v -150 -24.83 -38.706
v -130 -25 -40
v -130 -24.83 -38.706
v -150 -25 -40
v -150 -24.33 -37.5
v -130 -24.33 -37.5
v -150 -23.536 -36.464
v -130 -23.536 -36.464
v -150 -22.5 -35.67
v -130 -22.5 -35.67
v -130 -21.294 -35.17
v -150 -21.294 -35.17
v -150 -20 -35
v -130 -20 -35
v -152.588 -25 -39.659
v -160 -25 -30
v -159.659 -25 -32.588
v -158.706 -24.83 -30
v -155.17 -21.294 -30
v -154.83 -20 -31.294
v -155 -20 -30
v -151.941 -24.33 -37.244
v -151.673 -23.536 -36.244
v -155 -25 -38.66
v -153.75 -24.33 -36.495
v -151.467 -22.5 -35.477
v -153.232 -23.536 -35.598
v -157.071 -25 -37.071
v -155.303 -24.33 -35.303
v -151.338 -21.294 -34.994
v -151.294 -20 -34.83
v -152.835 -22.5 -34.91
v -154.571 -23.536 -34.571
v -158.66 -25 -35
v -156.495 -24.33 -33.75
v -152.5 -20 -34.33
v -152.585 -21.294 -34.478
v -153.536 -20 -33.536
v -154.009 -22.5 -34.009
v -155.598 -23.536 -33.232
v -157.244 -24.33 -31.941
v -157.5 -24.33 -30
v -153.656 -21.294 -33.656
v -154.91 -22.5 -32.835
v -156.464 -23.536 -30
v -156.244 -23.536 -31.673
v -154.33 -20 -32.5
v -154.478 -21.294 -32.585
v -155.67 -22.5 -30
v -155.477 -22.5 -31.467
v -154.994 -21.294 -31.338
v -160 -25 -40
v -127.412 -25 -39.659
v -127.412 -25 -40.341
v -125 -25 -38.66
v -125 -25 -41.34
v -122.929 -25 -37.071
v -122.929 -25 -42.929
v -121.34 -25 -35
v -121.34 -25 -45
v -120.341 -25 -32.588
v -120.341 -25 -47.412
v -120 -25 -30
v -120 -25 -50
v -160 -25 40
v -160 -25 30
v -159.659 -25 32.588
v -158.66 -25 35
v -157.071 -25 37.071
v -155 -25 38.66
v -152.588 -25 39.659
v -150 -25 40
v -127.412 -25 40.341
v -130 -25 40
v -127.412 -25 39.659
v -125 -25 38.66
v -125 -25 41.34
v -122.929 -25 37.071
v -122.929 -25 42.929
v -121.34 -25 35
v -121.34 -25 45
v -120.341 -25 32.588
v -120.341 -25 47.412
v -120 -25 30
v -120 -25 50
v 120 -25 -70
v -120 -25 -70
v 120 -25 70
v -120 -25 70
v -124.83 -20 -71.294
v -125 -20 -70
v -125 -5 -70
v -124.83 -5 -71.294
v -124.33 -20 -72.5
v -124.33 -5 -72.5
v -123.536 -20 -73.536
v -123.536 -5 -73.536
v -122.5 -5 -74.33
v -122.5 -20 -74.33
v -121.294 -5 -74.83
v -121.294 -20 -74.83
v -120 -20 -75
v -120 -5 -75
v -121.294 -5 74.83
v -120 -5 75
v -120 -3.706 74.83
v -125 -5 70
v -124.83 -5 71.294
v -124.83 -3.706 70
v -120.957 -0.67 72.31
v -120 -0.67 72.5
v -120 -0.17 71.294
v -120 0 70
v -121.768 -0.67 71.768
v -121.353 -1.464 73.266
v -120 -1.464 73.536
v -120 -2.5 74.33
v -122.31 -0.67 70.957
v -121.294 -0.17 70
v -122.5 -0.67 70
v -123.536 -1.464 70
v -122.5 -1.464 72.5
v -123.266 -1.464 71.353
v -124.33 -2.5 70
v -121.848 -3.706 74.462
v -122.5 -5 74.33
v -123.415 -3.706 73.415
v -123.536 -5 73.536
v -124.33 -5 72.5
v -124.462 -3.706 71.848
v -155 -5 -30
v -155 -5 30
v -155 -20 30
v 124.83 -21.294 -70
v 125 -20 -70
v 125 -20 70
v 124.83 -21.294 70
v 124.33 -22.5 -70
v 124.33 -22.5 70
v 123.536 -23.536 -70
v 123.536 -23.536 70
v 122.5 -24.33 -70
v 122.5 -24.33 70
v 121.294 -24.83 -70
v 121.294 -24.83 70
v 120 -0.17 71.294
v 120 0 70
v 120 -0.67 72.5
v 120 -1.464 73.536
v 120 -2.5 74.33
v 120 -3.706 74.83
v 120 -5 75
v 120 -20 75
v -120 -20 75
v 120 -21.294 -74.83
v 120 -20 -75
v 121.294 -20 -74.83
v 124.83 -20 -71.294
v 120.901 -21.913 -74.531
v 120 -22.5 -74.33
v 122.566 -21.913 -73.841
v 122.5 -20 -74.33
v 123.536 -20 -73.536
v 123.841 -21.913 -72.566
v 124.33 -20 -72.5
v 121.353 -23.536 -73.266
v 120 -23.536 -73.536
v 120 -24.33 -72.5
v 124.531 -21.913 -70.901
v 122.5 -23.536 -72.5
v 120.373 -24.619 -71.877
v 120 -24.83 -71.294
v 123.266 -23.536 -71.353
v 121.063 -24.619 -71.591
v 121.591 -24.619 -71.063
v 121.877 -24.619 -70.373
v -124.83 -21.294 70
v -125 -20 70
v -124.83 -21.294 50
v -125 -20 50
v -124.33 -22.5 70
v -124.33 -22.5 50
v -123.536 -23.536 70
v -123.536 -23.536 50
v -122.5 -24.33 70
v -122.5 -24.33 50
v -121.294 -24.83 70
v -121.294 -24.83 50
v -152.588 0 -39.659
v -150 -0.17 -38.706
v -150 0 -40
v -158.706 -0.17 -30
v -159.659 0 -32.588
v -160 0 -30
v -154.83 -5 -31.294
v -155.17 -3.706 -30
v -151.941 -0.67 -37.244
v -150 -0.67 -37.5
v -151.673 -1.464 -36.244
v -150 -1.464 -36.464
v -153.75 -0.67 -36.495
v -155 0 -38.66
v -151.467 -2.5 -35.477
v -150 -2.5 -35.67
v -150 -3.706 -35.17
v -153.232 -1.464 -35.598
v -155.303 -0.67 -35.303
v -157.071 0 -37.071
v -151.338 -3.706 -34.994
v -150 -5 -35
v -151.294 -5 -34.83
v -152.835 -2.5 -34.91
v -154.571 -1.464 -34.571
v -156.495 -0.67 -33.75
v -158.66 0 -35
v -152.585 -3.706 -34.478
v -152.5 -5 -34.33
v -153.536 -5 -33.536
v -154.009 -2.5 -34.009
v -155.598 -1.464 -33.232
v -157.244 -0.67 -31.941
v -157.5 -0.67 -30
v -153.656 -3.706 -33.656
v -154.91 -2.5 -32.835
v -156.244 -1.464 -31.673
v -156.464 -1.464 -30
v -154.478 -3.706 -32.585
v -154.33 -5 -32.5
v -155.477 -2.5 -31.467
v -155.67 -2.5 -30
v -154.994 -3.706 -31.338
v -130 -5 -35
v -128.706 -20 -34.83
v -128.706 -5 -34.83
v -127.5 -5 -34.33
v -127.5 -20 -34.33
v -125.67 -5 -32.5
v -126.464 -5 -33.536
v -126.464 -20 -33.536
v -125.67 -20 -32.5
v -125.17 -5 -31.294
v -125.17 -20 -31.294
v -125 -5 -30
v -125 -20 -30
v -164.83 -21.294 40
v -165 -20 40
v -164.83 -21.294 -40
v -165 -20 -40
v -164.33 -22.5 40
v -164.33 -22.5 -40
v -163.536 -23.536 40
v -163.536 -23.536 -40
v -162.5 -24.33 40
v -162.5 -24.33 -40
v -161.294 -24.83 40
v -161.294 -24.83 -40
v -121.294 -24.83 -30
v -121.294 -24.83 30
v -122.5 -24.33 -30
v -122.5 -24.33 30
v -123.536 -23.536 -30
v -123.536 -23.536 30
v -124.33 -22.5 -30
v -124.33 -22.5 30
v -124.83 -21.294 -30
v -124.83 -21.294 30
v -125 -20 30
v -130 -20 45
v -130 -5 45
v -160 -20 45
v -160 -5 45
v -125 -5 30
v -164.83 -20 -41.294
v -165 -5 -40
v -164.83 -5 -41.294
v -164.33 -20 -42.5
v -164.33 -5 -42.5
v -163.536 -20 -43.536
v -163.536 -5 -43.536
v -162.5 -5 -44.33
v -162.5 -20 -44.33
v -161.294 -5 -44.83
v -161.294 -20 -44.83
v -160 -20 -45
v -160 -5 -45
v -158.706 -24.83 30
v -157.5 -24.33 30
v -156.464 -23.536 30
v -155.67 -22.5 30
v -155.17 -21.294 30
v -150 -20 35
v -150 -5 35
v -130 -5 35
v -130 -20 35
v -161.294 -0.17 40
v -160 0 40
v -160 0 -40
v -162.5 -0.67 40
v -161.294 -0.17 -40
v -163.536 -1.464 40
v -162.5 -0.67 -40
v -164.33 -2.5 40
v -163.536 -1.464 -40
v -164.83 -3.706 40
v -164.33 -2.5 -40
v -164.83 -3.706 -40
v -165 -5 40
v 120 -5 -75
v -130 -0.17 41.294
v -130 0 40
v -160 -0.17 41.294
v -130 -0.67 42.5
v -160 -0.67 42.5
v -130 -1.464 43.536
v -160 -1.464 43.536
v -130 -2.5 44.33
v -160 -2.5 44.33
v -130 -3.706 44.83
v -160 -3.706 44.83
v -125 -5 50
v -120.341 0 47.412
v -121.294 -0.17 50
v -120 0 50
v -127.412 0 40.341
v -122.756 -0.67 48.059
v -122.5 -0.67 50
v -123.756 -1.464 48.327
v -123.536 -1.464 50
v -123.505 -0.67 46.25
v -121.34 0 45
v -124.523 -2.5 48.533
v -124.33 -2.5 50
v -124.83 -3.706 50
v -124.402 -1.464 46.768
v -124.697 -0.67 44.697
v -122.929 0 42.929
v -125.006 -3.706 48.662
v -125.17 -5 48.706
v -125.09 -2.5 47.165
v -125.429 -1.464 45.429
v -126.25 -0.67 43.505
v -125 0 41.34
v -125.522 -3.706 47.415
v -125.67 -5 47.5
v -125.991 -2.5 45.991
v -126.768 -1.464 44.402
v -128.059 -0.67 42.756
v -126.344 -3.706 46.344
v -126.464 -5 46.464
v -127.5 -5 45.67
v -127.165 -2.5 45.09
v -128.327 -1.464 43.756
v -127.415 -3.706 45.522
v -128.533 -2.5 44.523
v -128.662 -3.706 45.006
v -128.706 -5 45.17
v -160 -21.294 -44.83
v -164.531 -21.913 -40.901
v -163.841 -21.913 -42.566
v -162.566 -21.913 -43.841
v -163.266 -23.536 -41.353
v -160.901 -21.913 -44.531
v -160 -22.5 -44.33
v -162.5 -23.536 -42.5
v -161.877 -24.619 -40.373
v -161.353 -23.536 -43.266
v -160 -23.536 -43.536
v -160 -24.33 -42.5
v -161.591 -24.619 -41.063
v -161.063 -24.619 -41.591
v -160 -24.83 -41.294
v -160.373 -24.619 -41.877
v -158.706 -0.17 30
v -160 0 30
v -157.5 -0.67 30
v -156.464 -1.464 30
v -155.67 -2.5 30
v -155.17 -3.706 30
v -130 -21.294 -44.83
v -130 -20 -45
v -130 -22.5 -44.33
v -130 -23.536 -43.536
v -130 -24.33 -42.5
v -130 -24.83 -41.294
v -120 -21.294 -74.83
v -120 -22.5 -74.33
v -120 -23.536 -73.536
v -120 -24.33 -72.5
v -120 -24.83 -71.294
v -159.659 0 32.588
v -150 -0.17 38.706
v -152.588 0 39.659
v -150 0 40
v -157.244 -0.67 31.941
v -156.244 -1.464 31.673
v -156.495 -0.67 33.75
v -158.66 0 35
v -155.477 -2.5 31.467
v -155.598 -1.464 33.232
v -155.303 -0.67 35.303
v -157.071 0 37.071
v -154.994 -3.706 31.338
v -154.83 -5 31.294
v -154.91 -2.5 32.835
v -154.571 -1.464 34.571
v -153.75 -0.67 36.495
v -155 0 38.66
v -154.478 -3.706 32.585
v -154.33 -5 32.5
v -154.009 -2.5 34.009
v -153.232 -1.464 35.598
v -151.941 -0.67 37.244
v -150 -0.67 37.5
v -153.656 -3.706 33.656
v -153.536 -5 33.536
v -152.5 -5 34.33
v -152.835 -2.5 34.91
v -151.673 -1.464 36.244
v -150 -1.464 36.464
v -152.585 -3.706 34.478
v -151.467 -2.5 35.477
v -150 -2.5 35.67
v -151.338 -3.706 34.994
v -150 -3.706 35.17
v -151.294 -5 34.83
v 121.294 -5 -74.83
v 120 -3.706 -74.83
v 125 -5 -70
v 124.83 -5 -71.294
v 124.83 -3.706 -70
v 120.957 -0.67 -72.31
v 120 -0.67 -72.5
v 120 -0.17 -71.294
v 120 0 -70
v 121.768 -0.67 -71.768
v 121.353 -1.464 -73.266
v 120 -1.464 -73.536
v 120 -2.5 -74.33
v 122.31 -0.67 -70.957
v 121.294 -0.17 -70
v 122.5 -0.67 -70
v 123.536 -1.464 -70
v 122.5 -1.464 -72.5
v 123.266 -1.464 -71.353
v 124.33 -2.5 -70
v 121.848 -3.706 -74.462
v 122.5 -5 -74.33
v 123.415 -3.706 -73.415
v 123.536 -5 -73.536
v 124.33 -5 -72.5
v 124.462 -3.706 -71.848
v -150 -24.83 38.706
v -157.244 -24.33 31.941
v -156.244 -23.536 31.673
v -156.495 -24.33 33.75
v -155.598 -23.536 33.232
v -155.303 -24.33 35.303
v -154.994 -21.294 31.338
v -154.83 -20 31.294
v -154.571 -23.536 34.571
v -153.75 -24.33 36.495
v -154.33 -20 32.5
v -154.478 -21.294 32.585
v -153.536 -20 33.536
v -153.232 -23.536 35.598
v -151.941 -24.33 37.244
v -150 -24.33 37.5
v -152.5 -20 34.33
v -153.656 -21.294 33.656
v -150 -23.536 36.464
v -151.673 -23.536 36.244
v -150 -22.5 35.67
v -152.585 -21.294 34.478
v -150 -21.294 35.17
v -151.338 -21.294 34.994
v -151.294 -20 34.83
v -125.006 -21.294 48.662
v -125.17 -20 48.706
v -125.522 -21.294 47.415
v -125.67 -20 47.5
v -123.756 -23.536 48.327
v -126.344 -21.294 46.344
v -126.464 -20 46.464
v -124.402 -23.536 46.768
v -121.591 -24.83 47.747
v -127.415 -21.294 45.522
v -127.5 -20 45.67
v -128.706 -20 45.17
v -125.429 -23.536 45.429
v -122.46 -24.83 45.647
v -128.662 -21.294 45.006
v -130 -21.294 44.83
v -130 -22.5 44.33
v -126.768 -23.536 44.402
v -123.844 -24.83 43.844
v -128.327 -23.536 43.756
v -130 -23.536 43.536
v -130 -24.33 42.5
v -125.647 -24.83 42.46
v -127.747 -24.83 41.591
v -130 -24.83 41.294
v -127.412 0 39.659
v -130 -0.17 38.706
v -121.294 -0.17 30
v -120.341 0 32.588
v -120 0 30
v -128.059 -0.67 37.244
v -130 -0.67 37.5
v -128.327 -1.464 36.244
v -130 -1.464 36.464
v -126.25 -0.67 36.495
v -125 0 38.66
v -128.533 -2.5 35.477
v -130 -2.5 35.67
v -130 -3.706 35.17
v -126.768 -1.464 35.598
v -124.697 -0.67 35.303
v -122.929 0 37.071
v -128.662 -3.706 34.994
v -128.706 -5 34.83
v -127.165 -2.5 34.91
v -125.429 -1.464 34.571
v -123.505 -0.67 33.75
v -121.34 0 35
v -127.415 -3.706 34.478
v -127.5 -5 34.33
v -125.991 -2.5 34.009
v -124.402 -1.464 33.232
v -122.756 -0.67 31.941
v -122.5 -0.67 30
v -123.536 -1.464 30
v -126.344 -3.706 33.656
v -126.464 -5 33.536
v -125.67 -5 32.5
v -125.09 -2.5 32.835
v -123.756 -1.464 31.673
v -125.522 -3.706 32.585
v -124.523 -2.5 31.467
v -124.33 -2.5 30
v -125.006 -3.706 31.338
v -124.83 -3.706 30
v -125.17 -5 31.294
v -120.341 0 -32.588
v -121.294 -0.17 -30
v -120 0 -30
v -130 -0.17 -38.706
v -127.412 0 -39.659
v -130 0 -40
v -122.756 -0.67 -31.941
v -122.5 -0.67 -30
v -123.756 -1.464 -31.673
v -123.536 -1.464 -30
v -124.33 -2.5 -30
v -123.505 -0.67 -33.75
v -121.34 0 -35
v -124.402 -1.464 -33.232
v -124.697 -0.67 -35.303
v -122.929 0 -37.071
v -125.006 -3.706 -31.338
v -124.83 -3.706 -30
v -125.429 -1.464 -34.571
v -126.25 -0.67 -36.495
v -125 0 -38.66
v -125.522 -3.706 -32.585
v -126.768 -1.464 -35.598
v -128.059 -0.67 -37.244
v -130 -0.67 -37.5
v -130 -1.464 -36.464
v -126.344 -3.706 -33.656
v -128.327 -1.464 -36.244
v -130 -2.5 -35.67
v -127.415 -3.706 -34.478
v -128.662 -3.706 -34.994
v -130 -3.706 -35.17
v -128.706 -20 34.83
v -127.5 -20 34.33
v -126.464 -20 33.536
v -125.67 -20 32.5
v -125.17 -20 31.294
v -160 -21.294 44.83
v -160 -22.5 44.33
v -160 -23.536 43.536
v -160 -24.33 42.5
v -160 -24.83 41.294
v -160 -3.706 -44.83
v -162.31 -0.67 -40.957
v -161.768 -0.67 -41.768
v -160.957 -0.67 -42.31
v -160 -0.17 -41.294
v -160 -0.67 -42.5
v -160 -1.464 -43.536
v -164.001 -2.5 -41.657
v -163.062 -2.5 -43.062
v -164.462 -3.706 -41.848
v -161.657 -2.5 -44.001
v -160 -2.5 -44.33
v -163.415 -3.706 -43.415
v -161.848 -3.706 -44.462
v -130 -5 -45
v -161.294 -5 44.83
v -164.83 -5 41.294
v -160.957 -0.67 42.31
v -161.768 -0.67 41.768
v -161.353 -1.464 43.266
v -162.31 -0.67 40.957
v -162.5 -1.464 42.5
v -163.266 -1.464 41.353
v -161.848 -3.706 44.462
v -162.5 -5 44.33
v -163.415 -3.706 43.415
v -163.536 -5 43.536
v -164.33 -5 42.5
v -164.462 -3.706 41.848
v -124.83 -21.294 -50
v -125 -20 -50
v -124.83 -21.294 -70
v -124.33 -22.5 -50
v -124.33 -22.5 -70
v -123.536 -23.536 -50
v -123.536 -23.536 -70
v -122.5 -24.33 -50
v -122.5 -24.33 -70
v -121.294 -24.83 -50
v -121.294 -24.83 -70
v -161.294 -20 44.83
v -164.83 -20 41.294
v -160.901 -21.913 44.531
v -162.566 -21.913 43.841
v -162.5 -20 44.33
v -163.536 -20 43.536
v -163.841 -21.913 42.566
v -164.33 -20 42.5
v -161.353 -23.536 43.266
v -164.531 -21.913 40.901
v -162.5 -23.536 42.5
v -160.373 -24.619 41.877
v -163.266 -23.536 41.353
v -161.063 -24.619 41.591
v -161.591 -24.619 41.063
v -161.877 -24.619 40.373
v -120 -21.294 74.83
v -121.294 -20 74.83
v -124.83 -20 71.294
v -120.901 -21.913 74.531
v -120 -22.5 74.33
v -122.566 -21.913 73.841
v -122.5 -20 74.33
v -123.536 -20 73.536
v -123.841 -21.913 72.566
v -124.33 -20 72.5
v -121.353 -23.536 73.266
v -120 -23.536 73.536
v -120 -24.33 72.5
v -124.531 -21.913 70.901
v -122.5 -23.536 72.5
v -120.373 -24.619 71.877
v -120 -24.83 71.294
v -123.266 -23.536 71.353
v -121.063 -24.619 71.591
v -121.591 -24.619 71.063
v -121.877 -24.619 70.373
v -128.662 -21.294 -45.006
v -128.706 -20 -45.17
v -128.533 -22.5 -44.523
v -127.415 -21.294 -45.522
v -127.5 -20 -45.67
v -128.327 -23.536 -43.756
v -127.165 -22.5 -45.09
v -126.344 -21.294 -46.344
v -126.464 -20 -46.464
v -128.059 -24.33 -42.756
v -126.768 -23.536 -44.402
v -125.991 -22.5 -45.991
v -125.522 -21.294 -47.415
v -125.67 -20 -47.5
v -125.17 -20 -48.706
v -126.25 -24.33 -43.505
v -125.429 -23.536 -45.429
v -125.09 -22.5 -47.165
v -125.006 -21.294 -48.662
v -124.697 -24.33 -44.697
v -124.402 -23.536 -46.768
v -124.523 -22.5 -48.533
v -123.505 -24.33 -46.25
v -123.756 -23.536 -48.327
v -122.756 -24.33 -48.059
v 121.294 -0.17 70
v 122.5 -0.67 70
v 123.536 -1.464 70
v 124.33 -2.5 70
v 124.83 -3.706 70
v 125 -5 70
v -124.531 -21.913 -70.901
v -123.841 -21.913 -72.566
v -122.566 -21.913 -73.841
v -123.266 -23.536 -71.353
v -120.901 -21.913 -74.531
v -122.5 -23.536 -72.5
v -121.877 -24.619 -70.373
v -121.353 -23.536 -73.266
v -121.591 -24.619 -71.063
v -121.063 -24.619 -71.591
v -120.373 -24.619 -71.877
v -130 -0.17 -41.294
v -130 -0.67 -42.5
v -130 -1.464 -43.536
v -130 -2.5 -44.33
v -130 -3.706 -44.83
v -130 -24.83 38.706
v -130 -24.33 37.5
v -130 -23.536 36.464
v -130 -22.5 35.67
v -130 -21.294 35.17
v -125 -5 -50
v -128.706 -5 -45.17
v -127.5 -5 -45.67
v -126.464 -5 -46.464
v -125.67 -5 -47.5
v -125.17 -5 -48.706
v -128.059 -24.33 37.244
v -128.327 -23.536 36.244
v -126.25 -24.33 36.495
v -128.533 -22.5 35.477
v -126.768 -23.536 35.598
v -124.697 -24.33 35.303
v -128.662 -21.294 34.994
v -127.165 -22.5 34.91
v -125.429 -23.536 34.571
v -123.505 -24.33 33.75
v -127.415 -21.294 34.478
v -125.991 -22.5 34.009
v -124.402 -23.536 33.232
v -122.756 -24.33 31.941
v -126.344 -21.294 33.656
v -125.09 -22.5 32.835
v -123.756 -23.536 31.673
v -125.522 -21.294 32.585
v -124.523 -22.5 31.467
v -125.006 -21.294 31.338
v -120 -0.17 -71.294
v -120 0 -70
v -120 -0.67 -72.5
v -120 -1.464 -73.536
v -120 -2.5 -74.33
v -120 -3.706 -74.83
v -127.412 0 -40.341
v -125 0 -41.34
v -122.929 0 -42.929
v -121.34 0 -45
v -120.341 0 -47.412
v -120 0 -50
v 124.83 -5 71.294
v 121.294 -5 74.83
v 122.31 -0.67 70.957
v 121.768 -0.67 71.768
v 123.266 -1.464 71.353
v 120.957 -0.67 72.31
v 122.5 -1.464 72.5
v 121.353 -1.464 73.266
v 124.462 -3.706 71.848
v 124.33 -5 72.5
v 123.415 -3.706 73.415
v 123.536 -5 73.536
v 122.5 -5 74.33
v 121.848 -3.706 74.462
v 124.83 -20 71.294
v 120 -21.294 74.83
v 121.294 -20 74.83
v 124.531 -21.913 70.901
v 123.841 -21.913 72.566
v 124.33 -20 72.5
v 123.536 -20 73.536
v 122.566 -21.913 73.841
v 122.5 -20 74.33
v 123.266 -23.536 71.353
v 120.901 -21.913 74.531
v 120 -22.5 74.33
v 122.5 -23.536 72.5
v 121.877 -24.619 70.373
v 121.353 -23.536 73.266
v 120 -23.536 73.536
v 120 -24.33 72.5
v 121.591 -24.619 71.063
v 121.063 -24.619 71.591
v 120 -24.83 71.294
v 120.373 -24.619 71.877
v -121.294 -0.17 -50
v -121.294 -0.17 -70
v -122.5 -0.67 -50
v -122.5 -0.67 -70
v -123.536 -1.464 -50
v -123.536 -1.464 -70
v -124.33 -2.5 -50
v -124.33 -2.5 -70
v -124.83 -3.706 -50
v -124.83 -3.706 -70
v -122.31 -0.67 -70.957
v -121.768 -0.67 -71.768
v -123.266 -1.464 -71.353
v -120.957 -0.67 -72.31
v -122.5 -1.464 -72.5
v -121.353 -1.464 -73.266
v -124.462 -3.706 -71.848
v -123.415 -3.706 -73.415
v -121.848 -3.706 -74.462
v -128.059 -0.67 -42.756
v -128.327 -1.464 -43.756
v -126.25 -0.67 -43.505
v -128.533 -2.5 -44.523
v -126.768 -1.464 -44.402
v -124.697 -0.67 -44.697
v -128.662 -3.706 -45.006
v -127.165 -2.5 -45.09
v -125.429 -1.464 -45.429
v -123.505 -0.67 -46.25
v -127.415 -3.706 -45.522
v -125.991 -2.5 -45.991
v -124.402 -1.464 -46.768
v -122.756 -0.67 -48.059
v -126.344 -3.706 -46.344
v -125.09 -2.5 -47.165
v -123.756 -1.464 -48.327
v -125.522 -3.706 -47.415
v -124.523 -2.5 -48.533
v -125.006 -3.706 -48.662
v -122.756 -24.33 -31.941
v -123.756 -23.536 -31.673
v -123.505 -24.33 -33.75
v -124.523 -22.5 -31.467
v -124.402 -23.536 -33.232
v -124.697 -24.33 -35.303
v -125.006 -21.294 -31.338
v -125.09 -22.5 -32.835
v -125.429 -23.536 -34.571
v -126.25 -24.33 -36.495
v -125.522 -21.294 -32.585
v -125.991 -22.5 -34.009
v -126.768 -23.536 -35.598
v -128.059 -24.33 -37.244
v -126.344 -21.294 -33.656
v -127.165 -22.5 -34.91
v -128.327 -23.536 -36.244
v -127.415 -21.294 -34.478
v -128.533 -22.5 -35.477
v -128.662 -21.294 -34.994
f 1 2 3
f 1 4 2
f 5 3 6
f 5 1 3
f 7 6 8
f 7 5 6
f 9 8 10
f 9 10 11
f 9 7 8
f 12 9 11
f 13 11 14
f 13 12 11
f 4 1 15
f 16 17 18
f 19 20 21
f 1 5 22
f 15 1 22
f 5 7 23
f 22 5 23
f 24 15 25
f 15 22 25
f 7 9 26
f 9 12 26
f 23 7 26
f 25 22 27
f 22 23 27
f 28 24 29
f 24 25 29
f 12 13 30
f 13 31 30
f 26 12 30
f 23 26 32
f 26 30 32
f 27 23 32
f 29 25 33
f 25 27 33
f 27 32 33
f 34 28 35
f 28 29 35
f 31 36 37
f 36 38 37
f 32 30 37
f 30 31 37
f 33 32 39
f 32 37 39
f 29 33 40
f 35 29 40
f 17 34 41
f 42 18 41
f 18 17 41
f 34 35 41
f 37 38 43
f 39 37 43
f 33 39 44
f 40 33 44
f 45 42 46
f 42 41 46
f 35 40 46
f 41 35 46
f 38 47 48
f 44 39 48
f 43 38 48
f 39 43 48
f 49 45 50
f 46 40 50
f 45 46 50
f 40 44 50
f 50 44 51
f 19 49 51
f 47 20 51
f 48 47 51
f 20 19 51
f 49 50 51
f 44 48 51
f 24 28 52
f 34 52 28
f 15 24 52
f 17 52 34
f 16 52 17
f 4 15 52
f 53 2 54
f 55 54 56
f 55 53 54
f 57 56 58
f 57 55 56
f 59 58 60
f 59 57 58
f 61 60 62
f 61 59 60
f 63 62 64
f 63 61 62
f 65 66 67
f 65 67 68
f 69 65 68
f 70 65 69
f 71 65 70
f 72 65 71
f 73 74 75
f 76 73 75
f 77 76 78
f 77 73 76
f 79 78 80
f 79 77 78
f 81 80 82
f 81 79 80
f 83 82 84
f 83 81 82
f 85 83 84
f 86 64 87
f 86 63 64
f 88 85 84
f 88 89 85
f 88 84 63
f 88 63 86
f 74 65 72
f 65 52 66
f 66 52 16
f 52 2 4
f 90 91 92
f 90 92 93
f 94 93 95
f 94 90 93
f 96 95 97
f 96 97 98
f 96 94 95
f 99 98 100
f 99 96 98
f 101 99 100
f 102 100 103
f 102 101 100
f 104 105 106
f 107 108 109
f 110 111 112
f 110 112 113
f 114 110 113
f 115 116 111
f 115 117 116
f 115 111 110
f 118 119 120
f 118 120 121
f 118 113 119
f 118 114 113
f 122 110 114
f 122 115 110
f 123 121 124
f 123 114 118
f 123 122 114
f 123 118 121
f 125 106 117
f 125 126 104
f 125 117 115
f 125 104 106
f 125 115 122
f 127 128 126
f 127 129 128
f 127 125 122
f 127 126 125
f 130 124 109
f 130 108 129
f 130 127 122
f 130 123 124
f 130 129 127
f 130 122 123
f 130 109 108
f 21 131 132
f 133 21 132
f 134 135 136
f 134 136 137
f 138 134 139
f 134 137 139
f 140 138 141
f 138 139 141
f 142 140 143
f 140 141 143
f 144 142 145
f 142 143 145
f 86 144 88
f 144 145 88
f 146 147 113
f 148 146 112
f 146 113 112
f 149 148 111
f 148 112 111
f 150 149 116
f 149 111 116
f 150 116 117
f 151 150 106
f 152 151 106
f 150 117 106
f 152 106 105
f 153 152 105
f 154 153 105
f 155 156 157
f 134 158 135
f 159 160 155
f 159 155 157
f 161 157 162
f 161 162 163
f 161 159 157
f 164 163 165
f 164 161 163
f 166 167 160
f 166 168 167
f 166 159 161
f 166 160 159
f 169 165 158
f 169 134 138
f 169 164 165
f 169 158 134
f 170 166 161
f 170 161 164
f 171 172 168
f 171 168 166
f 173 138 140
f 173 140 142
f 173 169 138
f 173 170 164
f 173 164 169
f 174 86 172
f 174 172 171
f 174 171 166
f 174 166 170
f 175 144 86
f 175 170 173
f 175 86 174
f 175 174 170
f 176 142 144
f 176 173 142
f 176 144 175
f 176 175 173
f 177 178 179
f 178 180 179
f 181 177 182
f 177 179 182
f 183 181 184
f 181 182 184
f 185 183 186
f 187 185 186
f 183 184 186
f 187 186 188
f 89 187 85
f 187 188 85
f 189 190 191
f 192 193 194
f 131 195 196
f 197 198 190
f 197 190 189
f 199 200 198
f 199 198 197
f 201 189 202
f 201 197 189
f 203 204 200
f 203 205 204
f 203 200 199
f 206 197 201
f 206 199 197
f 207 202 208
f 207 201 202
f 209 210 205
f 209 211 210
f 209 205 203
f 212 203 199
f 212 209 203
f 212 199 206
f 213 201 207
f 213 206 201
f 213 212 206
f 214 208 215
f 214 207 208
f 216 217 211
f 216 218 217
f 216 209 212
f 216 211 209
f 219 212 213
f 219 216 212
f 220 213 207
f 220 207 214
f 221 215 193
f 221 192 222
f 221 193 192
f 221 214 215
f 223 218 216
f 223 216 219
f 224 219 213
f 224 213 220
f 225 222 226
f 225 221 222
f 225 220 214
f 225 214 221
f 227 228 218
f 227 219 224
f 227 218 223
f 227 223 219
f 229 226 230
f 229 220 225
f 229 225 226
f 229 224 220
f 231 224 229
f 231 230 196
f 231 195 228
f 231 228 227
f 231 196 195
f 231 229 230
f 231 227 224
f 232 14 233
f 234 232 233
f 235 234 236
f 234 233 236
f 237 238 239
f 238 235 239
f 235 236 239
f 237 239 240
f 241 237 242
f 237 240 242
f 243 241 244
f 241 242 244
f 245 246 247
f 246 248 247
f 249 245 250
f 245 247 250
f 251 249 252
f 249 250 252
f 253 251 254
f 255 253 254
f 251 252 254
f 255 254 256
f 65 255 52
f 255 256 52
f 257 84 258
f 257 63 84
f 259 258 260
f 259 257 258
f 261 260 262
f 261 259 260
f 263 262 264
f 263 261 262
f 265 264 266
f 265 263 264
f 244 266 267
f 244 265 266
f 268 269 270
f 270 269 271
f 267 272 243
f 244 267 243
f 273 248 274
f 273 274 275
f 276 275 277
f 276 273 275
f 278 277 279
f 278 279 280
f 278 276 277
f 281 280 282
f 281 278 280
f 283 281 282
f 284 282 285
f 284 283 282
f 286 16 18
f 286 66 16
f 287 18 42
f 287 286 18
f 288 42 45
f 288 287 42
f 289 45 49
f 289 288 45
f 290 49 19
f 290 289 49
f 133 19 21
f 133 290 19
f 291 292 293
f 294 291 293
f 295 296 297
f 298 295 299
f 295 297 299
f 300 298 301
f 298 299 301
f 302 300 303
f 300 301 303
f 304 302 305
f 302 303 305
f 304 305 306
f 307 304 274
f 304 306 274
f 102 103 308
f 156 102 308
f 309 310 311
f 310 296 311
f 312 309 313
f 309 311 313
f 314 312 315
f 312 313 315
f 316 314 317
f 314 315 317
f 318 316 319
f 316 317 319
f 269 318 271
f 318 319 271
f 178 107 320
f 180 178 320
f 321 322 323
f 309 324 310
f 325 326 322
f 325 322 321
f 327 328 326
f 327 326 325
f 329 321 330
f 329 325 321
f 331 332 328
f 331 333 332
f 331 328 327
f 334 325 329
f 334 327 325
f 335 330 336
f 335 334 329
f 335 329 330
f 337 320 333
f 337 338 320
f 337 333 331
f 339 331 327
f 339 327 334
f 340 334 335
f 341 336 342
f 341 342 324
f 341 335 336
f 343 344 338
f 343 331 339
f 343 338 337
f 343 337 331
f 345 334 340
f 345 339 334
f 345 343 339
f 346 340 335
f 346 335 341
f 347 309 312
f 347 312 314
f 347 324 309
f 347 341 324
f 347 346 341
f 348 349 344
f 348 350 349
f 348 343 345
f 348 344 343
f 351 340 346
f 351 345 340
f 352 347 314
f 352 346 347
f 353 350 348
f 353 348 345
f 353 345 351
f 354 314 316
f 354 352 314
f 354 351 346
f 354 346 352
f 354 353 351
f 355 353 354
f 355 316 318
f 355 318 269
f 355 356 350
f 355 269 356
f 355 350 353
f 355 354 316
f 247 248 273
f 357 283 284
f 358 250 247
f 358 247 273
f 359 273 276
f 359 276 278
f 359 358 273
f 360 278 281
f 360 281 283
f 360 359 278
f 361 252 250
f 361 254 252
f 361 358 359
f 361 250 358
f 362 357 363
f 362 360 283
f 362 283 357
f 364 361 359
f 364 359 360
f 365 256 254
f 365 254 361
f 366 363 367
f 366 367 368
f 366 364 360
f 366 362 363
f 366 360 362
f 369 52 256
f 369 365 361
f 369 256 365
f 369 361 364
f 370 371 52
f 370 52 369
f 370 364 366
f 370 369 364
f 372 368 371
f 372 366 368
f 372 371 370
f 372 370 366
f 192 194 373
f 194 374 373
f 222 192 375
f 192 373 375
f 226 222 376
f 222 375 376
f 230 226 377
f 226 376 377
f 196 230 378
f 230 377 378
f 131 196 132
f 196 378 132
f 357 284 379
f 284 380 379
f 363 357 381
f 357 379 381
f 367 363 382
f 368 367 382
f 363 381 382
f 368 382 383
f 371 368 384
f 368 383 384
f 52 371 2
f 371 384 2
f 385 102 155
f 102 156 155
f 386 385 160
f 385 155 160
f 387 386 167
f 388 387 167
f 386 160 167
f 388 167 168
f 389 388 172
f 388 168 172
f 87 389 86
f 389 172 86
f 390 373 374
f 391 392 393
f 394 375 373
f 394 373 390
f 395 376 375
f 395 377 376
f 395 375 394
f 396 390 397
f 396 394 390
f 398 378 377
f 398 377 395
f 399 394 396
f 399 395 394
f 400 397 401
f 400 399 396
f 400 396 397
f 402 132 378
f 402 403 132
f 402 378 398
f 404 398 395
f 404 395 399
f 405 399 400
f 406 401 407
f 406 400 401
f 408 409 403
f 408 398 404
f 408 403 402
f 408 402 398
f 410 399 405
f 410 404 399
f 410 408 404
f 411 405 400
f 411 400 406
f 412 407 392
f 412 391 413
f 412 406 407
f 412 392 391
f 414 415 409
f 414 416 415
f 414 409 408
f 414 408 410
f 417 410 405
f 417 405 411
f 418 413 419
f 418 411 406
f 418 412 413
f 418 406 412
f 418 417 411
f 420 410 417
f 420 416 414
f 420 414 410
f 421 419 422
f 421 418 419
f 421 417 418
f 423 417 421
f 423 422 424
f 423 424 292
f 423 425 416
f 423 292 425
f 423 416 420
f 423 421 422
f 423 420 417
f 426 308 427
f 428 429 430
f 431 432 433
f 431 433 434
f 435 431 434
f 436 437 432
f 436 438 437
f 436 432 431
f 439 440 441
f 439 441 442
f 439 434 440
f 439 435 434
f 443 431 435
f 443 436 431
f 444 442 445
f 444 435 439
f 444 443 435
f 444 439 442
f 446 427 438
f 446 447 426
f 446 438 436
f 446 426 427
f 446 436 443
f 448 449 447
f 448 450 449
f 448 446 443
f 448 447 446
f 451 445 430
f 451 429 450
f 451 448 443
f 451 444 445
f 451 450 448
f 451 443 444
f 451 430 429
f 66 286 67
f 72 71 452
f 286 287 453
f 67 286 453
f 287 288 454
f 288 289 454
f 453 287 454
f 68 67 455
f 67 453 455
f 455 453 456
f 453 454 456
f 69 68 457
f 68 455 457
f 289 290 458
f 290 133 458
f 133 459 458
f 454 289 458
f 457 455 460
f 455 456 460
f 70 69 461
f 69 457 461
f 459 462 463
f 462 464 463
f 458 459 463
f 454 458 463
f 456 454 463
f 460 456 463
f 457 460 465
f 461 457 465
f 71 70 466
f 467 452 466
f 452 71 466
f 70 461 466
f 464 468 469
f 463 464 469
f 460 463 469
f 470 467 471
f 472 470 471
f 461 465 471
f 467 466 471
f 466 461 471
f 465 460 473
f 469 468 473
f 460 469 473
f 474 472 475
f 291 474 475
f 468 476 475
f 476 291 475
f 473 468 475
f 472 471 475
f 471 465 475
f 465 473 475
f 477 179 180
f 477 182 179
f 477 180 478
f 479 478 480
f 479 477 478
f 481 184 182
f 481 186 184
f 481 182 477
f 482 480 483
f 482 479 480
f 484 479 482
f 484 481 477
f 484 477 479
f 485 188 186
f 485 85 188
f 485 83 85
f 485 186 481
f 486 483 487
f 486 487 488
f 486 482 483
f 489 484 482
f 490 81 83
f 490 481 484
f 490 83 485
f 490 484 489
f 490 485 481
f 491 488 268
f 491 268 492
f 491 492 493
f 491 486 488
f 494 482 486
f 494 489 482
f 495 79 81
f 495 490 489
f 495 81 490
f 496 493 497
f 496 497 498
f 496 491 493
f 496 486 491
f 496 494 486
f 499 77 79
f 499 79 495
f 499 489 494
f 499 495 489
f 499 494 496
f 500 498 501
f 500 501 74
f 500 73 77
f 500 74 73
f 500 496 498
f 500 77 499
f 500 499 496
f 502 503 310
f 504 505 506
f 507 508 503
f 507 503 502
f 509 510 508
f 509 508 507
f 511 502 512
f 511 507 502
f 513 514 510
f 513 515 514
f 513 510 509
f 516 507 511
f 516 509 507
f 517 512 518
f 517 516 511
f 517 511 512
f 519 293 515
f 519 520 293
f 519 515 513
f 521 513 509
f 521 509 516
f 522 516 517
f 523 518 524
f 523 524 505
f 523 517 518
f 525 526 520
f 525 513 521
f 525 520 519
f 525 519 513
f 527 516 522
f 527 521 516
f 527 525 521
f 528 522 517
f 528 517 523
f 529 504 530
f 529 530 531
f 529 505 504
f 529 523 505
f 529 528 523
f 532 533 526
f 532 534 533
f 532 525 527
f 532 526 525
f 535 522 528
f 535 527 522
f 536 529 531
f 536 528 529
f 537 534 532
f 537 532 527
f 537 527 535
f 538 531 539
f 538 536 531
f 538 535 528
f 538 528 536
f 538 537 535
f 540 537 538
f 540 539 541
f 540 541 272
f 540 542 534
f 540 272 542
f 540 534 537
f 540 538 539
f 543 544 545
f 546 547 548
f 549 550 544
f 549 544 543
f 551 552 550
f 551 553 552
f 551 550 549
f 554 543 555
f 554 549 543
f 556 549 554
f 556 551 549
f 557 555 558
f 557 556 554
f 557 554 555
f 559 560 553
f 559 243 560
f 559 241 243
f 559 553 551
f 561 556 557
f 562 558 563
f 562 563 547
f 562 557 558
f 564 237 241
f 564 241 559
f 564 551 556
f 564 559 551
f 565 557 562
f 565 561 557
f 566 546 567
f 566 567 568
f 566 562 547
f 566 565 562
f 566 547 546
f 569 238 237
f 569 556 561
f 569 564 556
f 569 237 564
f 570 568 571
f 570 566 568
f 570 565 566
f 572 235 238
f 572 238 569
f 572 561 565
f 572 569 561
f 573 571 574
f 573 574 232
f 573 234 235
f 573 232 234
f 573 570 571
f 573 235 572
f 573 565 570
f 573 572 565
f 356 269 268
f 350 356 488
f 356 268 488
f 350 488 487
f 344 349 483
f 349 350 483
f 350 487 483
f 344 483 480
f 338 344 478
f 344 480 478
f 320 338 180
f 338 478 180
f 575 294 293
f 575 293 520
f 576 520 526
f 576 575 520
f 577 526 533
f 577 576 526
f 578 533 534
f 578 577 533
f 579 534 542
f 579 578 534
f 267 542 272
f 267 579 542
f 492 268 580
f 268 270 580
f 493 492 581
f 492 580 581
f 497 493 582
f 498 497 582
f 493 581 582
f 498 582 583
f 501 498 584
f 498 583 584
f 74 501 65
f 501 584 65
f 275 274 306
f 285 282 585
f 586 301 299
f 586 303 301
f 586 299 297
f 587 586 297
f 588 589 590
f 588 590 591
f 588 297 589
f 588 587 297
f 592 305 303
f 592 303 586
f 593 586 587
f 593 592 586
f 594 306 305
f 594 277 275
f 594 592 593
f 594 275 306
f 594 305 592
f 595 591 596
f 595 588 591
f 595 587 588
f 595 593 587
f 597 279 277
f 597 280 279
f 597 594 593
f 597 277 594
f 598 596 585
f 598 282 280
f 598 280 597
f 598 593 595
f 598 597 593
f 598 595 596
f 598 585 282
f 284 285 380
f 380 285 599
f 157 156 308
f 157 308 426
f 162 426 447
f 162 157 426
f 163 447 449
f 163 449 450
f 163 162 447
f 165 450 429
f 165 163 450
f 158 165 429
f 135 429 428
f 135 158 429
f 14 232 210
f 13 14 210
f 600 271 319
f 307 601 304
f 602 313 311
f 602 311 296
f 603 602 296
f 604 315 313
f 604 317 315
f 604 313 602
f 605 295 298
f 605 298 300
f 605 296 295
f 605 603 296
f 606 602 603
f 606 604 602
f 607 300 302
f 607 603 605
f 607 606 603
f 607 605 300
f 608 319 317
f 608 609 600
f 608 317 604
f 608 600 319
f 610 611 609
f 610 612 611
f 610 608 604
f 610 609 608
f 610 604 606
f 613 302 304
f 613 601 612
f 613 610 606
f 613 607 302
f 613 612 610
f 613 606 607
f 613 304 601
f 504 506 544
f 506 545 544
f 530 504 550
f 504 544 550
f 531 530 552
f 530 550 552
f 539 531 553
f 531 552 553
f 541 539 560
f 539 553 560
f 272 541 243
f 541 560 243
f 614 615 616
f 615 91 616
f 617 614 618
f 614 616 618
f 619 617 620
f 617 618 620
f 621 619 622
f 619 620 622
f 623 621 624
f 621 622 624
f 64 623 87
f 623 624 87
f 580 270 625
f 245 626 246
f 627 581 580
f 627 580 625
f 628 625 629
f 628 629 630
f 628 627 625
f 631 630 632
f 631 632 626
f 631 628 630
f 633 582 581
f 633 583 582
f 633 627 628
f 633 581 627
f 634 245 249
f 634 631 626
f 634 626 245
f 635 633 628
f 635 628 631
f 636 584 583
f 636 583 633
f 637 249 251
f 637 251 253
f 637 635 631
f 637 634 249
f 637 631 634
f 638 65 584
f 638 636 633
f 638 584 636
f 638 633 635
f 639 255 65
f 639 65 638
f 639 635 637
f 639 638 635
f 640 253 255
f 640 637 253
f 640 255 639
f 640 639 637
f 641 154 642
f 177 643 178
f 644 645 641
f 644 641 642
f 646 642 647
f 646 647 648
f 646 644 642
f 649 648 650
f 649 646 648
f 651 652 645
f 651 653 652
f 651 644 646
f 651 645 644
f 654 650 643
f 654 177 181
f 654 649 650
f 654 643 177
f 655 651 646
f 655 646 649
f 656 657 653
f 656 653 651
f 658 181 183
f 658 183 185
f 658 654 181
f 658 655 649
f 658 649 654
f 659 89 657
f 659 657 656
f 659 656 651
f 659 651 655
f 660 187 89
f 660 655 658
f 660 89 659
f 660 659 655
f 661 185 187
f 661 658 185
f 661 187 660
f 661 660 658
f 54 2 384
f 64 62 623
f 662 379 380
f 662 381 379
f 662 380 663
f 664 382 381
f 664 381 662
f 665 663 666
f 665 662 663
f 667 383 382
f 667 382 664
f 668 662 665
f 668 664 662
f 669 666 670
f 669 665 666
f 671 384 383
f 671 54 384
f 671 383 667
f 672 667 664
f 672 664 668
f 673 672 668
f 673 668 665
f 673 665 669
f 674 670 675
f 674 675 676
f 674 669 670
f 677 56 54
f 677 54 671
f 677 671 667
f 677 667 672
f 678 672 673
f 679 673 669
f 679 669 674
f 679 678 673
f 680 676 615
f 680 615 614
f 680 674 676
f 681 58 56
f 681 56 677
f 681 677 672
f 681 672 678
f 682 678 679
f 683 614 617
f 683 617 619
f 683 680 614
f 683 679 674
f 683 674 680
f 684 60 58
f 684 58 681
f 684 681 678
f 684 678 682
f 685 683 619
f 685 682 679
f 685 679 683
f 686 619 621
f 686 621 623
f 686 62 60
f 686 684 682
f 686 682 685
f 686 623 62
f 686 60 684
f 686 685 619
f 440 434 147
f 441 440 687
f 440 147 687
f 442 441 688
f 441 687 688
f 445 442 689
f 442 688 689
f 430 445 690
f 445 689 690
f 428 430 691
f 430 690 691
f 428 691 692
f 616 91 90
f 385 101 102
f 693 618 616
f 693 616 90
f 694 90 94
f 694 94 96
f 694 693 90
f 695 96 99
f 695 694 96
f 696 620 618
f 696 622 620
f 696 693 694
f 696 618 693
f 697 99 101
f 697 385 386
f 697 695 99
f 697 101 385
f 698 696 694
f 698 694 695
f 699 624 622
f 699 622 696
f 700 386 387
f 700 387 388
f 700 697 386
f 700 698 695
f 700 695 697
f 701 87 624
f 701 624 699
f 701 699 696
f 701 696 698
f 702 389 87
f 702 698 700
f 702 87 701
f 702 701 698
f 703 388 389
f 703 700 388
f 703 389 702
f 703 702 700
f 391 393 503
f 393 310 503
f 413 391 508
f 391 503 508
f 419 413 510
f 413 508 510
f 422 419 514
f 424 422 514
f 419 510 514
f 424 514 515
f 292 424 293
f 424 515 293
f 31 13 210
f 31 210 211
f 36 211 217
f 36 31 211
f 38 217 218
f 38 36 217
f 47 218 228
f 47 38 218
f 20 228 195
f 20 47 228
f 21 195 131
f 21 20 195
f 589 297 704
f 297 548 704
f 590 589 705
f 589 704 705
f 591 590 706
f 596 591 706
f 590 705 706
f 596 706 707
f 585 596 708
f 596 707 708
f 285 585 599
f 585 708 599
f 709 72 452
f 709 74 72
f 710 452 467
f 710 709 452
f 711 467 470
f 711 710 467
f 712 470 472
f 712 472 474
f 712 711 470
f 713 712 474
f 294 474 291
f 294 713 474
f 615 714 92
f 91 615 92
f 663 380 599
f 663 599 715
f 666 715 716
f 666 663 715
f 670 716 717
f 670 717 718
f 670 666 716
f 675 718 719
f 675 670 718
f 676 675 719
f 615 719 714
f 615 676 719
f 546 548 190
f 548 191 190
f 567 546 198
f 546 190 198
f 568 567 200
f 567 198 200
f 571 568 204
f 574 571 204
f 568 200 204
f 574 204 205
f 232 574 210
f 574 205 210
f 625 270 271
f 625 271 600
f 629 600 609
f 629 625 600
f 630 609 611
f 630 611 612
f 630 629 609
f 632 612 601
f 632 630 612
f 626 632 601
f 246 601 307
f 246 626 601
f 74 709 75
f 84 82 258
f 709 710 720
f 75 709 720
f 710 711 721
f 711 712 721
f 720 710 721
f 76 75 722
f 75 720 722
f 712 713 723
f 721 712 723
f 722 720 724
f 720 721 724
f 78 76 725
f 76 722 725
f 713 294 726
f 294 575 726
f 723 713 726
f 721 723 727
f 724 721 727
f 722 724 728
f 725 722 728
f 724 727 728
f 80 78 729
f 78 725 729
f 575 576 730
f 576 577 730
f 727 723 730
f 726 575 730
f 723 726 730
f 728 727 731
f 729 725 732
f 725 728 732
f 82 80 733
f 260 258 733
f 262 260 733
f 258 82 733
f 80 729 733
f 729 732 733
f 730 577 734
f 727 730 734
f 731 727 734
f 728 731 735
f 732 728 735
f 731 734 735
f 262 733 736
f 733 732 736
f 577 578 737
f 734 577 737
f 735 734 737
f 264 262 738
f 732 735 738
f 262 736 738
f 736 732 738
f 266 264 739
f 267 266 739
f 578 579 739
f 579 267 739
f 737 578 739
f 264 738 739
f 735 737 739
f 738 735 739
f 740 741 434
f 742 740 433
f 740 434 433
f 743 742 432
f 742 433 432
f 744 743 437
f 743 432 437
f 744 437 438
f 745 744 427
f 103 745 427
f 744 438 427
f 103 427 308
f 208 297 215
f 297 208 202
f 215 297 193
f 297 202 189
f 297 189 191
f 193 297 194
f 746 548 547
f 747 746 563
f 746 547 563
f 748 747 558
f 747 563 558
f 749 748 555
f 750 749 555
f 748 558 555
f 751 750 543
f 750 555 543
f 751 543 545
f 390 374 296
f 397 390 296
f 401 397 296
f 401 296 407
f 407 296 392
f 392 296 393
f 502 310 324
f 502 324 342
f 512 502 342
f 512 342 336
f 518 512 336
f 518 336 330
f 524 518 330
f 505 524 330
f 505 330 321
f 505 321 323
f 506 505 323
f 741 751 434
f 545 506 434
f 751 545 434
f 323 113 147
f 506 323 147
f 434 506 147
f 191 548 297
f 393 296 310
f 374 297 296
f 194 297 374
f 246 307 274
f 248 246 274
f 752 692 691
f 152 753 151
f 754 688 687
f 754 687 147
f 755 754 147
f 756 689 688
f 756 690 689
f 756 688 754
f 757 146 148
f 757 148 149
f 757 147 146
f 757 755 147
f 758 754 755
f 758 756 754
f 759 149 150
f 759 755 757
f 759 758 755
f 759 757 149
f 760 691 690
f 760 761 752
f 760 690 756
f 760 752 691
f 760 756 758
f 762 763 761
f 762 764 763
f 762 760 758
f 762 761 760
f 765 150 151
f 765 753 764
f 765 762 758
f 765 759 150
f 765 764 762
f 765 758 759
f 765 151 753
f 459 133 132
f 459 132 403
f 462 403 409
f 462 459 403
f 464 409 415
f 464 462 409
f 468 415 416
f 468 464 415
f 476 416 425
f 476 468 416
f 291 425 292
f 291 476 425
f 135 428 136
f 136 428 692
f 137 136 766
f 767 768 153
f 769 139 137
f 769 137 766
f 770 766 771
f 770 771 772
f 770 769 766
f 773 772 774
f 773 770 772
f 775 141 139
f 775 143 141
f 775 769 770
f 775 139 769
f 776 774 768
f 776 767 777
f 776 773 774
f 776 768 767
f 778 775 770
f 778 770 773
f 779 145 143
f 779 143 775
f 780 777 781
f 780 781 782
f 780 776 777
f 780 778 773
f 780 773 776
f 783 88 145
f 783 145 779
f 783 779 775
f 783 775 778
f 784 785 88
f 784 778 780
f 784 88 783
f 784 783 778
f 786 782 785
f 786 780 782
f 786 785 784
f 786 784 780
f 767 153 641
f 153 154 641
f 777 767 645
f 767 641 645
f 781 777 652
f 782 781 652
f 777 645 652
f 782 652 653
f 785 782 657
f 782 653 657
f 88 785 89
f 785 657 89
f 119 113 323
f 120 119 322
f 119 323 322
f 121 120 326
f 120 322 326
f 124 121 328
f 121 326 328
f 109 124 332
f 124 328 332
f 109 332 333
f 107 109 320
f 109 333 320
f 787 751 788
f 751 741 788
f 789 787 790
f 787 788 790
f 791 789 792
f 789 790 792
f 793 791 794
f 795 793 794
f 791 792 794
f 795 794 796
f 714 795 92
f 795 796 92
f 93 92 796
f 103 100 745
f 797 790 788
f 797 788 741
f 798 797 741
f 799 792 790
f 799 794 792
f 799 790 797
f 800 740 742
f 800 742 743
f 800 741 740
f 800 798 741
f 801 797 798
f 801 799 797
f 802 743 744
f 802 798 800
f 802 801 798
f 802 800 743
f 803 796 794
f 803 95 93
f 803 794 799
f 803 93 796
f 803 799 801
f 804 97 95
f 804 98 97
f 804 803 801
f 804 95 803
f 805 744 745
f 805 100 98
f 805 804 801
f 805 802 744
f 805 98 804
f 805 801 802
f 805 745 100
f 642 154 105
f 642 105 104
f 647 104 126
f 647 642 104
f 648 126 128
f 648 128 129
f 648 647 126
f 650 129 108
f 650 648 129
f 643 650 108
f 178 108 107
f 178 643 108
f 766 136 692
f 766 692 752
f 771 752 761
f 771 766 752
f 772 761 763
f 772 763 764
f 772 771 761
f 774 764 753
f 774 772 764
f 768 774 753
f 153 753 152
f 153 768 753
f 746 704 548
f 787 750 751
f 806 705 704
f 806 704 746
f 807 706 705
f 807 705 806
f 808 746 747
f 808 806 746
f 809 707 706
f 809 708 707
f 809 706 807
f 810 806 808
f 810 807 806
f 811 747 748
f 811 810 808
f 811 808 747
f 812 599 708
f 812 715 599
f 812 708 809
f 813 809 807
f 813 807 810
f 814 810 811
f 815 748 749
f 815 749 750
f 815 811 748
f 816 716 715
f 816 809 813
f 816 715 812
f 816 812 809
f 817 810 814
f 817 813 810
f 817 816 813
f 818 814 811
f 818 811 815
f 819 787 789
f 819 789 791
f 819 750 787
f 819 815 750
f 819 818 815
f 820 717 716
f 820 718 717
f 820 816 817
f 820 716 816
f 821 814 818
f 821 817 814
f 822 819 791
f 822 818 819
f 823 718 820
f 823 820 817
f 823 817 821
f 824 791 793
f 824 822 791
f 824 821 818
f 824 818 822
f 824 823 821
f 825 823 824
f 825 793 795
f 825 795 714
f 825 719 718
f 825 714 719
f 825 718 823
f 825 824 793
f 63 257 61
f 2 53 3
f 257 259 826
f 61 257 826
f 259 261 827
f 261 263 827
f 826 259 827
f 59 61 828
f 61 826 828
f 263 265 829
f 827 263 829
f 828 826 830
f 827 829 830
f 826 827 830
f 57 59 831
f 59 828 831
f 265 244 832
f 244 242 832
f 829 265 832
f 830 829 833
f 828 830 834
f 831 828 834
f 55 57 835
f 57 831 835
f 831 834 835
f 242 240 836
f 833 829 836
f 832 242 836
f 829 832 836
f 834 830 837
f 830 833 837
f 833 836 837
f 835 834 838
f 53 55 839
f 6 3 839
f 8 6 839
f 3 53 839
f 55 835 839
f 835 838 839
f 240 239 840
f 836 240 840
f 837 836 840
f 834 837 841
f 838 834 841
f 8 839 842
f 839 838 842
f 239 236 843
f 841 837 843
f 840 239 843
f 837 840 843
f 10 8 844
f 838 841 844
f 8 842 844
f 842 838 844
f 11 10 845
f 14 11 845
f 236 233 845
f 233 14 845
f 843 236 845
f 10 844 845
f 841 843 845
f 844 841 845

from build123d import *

# Parameters (mm, degrees)
F1_DEPTH = 25
F2_R     = 5
F3_R     = 5
F4_R     = 4.99999


# Not quite as in the source:
# - a fillet or chamfer is up to 0.001 mm smaller than in the source, because OpenCascade refuses the exact size


with BuildPart() as f1:
    # F0 (on Front) → F1 (new body)
    with BuildSketch(Plane.XZ):
        Polygon((-125, 35), (-125, 45), (-165, 45), (-165, -45), (-125, -45), (-125, -35), (-155, -35), (-155, 35), align=None)
        Polygon((125, -75), (125, 75), (-125, 75), (-125, 45), (-125, 35), (-125, -35), (-125, -45), (-125, -75), align=None)
    extrude(amount=F1_DEPTH)

    # F2
    f2_edges = [f1.edges().sort_by_distance(p)[0] for p in [
        (-125, -12.5, 45),
        (-165, -12.5, 45),
        (-165, -12.5, -45),
        (-125, -12.5, -45),
        (-125, -12.5, -35),
        (-155, -12.5, -35),
        (-155, -12.5, 35),
        (-125, -12.5, 35),
        (-125, -12.5, 75),
        (-125, -12.5, -75),
        (125, -12.5, -75),
        (125, -12.5, 75),
    ]]
    fillet(f2_edges, radius=F2_R)

    # F3
    f3_edges = [f1.edges().sort_by_distance(p)[0] for p in [
        (-145, -25, 45),
    ]]
    fillet(f3_edges, radius=F3_R)

    # F4 (radius 5 in the source; OpenCascade refuses exactly that, so slightly less here)
    f4_edges = [f1.edges().sort_by_distance(p)[0] for p in [
        (-140, -25, 35),
        (-145, 0, -45),
        (-140, 0, -35),
    ]]
    fillet(f4_edges, radius=F4_R)


solid = f1.part
